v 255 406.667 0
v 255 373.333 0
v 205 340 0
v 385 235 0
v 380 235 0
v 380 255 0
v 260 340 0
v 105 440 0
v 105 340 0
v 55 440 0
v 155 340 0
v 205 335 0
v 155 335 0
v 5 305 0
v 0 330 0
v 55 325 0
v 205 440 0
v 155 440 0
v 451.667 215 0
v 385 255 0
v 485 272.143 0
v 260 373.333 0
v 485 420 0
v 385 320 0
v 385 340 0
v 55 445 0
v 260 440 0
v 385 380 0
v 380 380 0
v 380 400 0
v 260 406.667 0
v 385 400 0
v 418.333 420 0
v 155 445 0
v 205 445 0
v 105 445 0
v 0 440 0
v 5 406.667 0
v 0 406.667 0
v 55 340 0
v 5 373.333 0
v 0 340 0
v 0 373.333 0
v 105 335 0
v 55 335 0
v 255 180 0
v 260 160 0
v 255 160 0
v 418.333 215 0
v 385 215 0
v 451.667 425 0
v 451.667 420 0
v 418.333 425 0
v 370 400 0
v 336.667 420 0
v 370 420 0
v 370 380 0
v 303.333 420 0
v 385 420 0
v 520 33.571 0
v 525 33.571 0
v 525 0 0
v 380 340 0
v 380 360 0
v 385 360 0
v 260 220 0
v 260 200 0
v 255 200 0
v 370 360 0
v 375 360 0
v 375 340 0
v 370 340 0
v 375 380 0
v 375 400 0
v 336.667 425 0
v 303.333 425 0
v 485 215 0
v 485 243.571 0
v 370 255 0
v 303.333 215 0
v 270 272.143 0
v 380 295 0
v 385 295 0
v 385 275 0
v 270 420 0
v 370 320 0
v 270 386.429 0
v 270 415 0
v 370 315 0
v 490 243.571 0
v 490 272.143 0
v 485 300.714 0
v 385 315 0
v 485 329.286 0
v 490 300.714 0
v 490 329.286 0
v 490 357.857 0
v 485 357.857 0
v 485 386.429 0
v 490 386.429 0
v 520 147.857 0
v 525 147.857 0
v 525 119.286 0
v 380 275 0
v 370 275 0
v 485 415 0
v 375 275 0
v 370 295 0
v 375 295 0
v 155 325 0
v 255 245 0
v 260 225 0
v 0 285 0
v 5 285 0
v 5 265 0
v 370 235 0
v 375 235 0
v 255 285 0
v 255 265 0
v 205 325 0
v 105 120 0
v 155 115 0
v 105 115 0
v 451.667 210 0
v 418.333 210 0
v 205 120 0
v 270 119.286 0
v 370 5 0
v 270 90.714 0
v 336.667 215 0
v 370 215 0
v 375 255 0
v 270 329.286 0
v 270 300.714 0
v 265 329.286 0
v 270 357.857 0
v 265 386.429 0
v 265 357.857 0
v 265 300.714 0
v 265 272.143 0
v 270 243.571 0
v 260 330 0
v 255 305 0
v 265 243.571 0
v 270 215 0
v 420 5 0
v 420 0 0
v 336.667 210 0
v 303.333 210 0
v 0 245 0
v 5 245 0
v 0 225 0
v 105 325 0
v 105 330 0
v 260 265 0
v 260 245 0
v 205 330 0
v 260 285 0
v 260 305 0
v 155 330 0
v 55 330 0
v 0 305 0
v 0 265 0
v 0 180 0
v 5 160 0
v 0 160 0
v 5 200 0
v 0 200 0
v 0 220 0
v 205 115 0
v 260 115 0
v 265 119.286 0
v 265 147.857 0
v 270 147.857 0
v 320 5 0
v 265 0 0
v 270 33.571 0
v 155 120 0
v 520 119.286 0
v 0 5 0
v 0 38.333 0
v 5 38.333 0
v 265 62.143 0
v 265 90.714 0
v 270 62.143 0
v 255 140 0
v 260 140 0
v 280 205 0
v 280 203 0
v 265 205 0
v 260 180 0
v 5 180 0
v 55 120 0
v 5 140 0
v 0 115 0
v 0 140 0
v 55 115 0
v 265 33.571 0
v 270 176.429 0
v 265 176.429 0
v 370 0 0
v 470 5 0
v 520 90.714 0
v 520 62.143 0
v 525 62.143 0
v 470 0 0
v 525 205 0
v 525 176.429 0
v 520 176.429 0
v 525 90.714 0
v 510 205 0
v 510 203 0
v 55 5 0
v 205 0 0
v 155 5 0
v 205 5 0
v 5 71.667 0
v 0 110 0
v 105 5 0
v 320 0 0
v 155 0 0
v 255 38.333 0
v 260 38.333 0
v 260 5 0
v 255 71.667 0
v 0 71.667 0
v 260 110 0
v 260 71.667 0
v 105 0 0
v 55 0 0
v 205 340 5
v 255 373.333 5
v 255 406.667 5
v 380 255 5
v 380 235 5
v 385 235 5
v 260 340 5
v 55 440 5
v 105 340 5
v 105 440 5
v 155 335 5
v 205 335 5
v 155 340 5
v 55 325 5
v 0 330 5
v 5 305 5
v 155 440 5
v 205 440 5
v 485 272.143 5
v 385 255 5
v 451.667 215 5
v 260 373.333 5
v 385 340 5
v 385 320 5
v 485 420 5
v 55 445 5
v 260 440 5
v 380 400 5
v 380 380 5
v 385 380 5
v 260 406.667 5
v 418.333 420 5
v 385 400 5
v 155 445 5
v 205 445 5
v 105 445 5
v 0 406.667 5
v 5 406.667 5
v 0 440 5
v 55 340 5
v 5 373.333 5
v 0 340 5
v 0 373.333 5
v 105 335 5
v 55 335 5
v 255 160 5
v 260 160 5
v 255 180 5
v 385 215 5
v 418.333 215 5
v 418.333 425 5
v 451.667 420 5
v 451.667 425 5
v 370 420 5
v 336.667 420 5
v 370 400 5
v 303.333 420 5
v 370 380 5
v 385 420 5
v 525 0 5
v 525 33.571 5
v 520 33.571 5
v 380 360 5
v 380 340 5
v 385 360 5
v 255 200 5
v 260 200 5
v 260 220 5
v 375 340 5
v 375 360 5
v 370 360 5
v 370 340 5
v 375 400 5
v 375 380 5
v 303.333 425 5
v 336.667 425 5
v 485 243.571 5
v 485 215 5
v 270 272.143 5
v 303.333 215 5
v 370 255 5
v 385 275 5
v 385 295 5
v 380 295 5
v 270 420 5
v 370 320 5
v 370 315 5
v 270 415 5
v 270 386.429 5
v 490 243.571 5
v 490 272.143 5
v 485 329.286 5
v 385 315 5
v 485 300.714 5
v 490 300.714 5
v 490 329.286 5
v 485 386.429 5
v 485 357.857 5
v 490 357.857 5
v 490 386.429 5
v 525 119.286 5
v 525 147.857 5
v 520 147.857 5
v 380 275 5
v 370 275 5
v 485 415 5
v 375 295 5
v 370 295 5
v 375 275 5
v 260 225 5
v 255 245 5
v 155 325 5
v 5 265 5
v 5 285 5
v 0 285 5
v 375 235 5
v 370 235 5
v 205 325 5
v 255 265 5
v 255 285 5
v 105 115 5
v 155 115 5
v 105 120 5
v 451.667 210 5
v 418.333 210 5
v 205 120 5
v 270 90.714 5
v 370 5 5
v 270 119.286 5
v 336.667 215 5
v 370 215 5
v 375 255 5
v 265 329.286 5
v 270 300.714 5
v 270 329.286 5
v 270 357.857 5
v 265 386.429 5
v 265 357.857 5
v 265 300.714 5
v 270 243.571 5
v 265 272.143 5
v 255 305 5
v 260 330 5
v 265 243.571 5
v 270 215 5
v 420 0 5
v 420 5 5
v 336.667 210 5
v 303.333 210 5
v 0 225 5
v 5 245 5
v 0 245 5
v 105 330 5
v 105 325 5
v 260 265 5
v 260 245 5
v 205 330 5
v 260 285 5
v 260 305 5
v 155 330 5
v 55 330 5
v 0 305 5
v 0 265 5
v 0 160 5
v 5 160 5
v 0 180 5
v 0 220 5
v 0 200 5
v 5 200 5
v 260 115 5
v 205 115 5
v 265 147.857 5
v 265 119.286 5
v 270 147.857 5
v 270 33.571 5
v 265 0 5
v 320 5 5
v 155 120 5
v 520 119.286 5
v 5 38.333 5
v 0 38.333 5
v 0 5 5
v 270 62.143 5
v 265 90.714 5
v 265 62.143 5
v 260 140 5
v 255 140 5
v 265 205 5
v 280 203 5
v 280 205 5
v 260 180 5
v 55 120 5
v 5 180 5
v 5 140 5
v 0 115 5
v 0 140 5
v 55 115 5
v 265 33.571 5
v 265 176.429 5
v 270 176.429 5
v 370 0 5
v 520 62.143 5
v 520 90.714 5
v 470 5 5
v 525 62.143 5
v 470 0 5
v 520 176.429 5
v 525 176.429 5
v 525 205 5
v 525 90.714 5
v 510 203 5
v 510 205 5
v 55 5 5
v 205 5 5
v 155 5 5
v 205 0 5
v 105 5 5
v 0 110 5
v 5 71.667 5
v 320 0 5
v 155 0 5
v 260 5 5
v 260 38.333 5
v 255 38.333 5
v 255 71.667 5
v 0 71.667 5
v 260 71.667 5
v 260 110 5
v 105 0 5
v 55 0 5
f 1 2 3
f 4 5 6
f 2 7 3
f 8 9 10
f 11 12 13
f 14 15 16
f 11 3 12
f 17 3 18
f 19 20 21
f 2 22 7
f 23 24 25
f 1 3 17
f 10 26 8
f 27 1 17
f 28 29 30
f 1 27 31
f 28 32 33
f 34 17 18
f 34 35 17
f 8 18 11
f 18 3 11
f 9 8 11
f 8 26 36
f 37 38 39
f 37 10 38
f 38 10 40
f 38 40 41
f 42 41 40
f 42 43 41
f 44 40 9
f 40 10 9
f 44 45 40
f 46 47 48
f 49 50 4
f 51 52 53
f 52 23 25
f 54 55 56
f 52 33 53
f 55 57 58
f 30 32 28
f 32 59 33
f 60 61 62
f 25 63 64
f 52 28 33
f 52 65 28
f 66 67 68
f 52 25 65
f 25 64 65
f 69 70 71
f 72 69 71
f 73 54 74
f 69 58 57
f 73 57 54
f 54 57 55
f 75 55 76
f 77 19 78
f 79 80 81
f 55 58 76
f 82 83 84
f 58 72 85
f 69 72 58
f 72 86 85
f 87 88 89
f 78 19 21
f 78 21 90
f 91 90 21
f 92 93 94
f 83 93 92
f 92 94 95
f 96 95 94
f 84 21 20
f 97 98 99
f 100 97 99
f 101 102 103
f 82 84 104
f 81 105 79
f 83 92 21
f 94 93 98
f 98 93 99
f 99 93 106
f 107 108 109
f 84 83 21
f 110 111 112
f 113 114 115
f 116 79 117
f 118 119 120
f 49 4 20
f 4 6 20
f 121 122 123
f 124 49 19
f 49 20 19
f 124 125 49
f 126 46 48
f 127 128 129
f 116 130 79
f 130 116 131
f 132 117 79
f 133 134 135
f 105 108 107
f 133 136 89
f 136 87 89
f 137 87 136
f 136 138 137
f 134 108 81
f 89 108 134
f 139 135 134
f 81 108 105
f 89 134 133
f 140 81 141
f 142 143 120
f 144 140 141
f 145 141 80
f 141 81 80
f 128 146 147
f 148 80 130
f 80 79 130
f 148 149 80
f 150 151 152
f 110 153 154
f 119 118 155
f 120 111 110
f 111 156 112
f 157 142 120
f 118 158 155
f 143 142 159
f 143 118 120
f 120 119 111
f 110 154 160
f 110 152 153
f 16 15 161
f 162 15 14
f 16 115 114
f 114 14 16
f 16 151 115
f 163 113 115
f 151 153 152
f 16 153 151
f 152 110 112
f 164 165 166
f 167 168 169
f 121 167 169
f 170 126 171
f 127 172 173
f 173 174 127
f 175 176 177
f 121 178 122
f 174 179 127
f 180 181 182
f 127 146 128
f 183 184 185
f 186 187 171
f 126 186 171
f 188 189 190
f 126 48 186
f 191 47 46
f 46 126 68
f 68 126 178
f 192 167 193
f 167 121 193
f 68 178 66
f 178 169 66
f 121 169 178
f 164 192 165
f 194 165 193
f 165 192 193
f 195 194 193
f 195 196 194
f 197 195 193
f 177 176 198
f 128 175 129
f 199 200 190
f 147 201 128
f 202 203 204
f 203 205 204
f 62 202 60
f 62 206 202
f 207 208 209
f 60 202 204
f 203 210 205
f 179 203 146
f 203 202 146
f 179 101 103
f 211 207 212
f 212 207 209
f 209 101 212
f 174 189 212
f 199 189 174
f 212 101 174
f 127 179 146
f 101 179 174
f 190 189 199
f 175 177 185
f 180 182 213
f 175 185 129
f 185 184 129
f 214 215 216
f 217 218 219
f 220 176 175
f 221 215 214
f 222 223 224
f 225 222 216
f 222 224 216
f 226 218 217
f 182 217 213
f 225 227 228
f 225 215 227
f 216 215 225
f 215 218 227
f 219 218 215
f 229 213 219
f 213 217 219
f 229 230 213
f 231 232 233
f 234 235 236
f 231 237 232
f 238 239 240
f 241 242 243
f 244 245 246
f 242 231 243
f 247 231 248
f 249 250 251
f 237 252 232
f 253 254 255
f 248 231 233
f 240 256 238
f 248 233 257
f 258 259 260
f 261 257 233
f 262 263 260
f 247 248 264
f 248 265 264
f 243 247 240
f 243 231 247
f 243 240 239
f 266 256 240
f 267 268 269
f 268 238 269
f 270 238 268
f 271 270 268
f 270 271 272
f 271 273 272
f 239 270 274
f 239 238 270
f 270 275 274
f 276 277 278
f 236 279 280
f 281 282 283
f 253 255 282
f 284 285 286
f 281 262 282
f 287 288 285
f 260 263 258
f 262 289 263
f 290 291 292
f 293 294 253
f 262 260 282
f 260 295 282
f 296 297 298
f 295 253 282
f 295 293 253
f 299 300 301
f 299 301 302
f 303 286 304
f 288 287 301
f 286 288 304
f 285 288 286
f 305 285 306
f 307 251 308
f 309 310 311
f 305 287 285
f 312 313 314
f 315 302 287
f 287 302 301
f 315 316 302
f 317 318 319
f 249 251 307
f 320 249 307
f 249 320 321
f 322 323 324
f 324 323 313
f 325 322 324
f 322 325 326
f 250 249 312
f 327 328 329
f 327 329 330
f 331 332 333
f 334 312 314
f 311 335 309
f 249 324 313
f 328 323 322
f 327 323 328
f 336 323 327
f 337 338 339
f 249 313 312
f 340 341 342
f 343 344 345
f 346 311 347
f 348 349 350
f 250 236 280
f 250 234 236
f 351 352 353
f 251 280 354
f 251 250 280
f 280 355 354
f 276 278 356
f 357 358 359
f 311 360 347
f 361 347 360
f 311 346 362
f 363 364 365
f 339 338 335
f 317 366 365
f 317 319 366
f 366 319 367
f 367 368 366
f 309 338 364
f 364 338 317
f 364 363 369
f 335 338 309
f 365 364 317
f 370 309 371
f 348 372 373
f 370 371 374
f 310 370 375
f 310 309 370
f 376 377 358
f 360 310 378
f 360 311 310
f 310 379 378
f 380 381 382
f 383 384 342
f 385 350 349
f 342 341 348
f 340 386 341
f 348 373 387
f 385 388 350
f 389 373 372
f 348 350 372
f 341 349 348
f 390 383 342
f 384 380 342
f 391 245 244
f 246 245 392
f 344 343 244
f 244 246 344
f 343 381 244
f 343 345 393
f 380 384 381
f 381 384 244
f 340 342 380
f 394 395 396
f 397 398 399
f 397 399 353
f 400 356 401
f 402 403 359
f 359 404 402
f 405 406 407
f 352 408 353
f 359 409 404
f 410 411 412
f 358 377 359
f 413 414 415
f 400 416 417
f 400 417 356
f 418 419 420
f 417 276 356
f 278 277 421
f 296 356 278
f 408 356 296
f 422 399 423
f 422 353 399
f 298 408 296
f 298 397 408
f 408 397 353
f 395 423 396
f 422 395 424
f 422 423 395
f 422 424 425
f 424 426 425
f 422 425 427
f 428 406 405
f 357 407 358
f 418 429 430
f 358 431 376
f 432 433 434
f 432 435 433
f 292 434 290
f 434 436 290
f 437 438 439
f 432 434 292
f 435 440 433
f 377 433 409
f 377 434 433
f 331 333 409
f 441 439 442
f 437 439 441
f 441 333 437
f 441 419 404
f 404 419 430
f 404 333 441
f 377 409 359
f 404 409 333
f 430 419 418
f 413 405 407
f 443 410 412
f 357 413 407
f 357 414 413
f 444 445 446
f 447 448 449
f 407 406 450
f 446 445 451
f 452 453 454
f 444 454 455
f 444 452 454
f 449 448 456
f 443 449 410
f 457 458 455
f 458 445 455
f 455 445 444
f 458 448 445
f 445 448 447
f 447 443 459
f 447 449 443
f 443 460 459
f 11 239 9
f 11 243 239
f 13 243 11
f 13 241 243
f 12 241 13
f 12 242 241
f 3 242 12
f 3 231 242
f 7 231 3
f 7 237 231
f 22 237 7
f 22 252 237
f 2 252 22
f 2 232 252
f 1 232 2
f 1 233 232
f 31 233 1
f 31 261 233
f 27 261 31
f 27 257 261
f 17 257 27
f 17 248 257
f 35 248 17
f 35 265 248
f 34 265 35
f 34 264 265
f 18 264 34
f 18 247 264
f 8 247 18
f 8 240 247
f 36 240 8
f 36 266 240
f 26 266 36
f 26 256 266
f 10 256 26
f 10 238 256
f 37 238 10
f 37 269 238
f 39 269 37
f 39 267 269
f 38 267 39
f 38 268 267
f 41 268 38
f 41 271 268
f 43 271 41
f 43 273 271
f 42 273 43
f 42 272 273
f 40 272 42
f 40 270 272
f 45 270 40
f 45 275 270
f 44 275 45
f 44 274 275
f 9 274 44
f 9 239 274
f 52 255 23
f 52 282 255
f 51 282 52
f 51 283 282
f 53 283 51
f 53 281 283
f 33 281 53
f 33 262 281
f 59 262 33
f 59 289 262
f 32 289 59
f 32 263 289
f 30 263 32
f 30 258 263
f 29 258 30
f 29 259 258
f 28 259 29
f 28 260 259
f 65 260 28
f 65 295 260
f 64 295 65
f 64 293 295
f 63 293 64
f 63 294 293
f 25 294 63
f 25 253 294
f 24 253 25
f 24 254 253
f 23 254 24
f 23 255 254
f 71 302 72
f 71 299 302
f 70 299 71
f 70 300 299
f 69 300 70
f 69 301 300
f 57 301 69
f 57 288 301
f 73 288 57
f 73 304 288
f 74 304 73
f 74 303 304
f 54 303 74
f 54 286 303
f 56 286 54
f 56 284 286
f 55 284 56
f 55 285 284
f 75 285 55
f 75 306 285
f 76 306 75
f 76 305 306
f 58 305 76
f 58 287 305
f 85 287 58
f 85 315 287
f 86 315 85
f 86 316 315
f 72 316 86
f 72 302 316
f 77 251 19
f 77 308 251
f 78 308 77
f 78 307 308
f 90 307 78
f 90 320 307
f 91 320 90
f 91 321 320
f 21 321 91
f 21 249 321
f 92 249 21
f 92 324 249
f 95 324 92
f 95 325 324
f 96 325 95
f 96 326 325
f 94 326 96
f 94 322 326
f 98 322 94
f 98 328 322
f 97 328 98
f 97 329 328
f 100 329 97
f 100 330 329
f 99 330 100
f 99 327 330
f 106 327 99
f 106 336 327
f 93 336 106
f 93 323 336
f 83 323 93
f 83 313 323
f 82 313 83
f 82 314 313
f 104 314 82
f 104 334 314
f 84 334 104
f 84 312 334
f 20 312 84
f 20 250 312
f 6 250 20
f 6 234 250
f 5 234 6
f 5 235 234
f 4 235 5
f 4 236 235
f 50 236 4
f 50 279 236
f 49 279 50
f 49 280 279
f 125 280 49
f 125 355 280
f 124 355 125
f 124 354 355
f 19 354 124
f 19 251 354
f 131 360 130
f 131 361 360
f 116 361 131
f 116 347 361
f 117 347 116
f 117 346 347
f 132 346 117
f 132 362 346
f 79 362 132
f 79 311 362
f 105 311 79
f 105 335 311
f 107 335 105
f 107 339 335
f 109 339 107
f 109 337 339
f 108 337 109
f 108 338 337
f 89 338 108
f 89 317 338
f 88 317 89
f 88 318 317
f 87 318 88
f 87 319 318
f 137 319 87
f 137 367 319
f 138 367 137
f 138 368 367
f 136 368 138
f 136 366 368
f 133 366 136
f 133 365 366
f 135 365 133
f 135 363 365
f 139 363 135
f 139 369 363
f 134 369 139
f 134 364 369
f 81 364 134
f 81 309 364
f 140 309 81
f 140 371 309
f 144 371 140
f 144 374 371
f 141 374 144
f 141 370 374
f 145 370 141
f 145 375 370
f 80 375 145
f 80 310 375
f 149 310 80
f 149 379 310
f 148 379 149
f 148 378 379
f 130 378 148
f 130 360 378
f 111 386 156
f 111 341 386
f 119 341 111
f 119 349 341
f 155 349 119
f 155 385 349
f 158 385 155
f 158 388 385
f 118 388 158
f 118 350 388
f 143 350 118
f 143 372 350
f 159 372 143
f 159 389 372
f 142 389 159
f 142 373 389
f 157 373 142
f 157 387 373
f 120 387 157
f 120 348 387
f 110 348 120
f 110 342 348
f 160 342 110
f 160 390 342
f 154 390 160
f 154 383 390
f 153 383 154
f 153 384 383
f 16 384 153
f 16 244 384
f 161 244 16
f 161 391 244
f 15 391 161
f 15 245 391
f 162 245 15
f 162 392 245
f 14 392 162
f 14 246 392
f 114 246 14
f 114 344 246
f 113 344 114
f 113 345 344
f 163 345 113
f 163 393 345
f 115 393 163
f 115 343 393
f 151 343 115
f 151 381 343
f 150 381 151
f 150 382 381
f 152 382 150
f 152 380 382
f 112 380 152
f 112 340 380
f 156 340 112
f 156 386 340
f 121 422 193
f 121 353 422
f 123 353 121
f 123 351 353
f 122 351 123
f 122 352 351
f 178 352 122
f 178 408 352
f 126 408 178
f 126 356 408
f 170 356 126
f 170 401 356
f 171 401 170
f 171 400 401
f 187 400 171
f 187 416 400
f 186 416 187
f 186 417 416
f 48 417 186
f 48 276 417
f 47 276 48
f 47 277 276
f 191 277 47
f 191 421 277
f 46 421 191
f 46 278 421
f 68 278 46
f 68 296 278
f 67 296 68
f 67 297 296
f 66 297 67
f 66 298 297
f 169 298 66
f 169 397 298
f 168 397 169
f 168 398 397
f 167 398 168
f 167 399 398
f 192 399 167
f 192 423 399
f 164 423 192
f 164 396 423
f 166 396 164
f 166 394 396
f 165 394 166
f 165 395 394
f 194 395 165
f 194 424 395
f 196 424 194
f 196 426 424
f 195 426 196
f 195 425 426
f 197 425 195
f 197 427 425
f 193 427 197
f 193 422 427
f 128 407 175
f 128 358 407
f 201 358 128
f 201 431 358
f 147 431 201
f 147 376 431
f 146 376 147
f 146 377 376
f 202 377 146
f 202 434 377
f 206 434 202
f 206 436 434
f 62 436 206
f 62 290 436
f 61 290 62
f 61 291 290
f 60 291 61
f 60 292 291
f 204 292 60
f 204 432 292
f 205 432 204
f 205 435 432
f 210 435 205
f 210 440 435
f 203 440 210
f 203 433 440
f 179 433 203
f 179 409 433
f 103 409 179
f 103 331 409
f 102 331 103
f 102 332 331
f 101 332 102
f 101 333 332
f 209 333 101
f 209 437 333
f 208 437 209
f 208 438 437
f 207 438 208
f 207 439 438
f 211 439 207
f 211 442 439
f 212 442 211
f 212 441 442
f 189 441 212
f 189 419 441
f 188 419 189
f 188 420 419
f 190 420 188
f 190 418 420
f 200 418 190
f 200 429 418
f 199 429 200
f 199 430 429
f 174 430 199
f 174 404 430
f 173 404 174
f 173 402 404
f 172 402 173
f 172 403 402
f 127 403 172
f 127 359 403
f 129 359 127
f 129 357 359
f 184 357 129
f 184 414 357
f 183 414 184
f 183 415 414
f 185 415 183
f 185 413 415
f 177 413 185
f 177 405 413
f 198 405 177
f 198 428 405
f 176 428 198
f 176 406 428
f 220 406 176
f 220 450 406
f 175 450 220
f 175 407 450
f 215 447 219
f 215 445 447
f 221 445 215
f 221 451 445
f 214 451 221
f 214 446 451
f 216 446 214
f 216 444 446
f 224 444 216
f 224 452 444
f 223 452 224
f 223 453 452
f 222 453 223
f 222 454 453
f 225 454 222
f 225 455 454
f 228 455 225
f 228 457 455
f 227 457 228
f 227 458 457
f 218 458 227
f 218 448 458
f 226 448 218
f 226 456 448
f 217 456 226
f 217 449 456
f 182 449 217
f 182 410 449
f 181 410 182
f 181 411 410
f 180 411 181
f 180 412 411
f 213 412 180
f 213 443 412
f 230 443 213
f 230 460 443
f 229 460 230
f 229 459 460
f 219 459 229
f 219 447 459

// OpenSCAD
// [FL_INDEX: keywords="openscad, 3d_parametric, Customizable_laser_cutted_box, csg_solid" | COT="Parametric OpenSCAD design from 3DCodeverse"]
// Title: Customizable laser cutted box


//Customizable Box 
//By Iron Momo


/* [Basic] */
box_width = 250;
box_height = 200;
box_depth = 100;
material_thickness = 5; //[3,5,10]

output_type = "STL"; //[DXF,STL]

/* [Advanced] */
spacing = 5; //[1,5,10]
ratio = 0.5; //[0.25,0.5]


/* [Hidden] */
h2 = box_height*ratio; //Height of the upper part
h1 = box_height*(1-ratio); //Height of the lower part

// preview[view: north, tilt:top]


if(output_type=="STL")
{linear_extrude(height = material_thickness, center = false) box_creation();
}

if(output_type=="DXF")
{box_creation();}



/*--------------*/
/* BOX CREATION */
/*--------------*/
module box_creation()
{
	top();
	translate([0,spacing+box_depth+2*material_thickness]) front_1();
	translate([0,2*spacing+box_depth+h1+3*material_thickness]) front_2();
	translate([0,3*spacing+4*material_thickness+box_depth+h1+h2,0]) bottom();
	translate([box_width+2*material_thickness+spacing,0,0])rear();
	translate([box_width+2*material_thickness+spacing,material_thickness+box_height+spacing,0]) sides();
}

/*----------------*/
/* Top of the box */
/*----------------*/
module top()
{

//Basic shape
translate([material_thickness,material_thickness,0]) square([box_width,box_depth]); 

//Notches
translate([0,material_thickness+box_depth,0]) square([box_width+2*material_thickness,material_thickness]);

translate([0,material_thickness,0]) square([material_thickness,box_depth/3]);
translate([0,material_thickness+2*box_depth/3,0]) square([material_thickness,box_depth/3]);

translate([material_thickness+box_width,material_thickness,0]) square([material_thickness,box_depth/3]);
translate([material_thickness+box_width,material_thickness+2*box_depth/3,0]) square([material_thickness,box_depth/3]);

translate([material_thickness+box_width/5,0,0]) square([box_width/5,material_thickness]);
translate([material_thickness+3*box_width/5,0,0]) square([box_width/5,material_thickness]);


}


/*--------------------*/
/* 2 sides of the box */
/*--------------------*/
module sides()
{
//1st side, upper and lower part
side_1();
translate ([material_thickness,h1+spacing+material_thickness,0]) side_2();

//2nd side is just a mirrored one
translate([2*box_depth+4*material_thickness+spacing,0,0])
{
	mirror ([1,0,0])
		{
		side_1();
		translate ([material_thickness,h1+spacing+material_thickness,0]) side_2();
		}
	}
}
/*------------------*/
/* Side: Upper part */
/*------------------*/
module side_2()
{

//Basic shape
polygon(points=[[0,h2],[box_depth,h2],[box_depth,0]], paths=[[0,1,2]]);

//Notches
translate([box_depth,h2/5,0]) square([material_thickness,h2/5]);
translate([box_depth,3*h2/5,0]) square([material_thickness,h2/5]);

translate([box_depth/3,h2,0]) square([box_depth/3,material_thickness]);
}

/*------------------*/
/* Side: Lower part */
/*------------------*/
module side_1()
{

//Basic shape
translate([material_thickness,material_thickness,0])
	{
	square([box_depth,h1]);
	polygon(points=[[0,box_height],[0,h1],[box_depth,h1]], paths=[[0,1,2]]);
	}

//Notches
translate([material_thickness+box_depth/3,0,0]) square([box_depth/3,material_thickness]);

translate([0,material_thickness+box_height/7,0]) square([material_thickness,box_height/7]);
translate([0,material_thickness+3*box_height/7,0]) square([material_thickness,box_height/7]);
translate([0,material_thickness+5*box_height/7,0]) square([material_thickness,box_height/7]);

translate([material_thickness+box_depth,material_thickness+h1/5,0]) square([material_thickness,h1/5]);
translate([material_thickness+box_depth,material_thickness+3*h1/5,0]) square([material_thickness,h1/5]);
}




/*-------------------------*/
/* Front plate: Upper part */
/*-------------------------*/
module front_2()
{

//Basic shape
translate([material_thickness,0,0]) square([box_width,h2]);

//Notches
translate([0,h2,0]) square([box_width/5+material_thickness,material_thickness]);
translate([material_thickness+2*box_width/5,h2,0]) square([box_width/5,material_thickness]);
translate([material_thickness+4*box_width/5,h2,0]) square([material_thickness+box_width/5,material_thickness]);

square([material_thickness,h2/5]);
translate([0,2*h2/5,0]) square([material_thickness,h2/5]);
translate([0,4*h2/5,0]) square([material_thickness,h2/5]);
	
translate([material_thickness+box_width,0,0]) square([material_thickness,h2/5]);
translate([material_thickness+box_width,2*h2/5,0]) square([material_thickness,h2/5]);
translate([material_thickness+box_width,4*h2/5,0]) square([material_thickness,h2/5]);
}


/*-------------------------*/
/* Front plate: Lower part */
/*-------------------------*/
module front_1()
{

//Basic shape
translate([material_thickness,material_thickness,0]) square([box_width,h1]);
	
//Notches
square([box_width/5+material_thickness,material_thickness]);
translate([material_thickness+2*box_width/5,0,0]) square([box_width/5,material_thickness]);
translate([material_thickness+4*box_width/5,0,0]) square([material_thickness+box_width/5,material_thickness]);

translate([0,material_thickness,0]) square([material_thickness,h1/5]);
translate([0,material_thickness+2*h1/5,0]) square([material_thickness,h1/5]);
translate([0,material_thickness+4*h1/5,0]) square([material_thickness,h1/5]);

translate([material_thickness+box_width,material_thickness,0]) square([material_thickness,h1/5]);
translate([material_thickness+box_width,material_thickness+2*h1/5,0]) square([material_thickness,h1/5]);
translate([material_thickness+box_width,material_thickness+4*h1/5,0]) square([material_thickness,h1/5]);
}


/*------------*/
/* Back plate */
/*------------*/
module rear()
{

//Basic shape
translate([material_thickness,material_thickness,0]) 
	{
	difference()
		{
		square([box_width,box_height]);
		translate([10,box_height-2,0]) square([box_width-20,2]);
		}
	}

square([box_width/5+material_thickness,material_thickness]);

//Notches
translate([material_thickness+2*box_width/5,0,0]) square([box_width/5,material_thickness]);
translate([material_thickness+4*box_width/5,0,0]) square([box_width/5+material_thickness,material_thickness]);
	
translate([0,material_thickness,0]) square([material_thickness,box_height/7]);
translate([0,material_thickness+2*box_height/7,0]) square([material_thickness,box_height/7]);
translate([0,material_thickness+4*box_height/7,0]) square([material_thickness,box_height/7]);
translate([0,material_thickness+6*box_height/7,0]) square([material_thickness,box_height/7]);

translate([material_thickness+box_width,material_thickness,0]) square([material_thickness,box_height/7]);
translate([material_thickness+box_width,material_thickness+2*box_height/7,0]) square([material_thickness,box_height/7]);
translate([material_thickness+box_width,material_thickness+4*box_height/7,0]) square([material_thickness,box_height/7]);
translate([material_thickness+box_width,material_thickness+6*box_height/7,0]) square([material_thickness,box_height/7]);
}

/*--------------*/
/* Bottom plate */
/*--------------*/
module bottom()
{

//Basic shape
translate([material_thickness,material_thickness,0]) square([box_width,box_depth]);

//Notches
translate([material_thickness+box_width/5,0,0]) square([box_width/5,material_thickness]);
translate([material_thickness+3*box_width/5,0,0]) square([box_width/5,material_thickness]);
translate([material_thickness+box_width/5,material_thickness+box_depth,0]) square([box_width/5,material_thickness]);
translate([material_thickness+3*box_width/5,material_thickness+box_depth,0]) square([box_width/5,material_thickness]);

translate([0,material_thickness,0]) square([material_thickness,box_depth/3]);
translate([0,material_thickness+2*box_depth/3,0]) square([material_thickness,box_depth/3]);
translate([material_thickness+box_width,material_thickness,0]) square([material_thickness,box_depth/3]);
translate([material_thickness+box_width,material_thickness+2*box_depth/3,0]) square([material_thickness,box_depth/3]);
}
